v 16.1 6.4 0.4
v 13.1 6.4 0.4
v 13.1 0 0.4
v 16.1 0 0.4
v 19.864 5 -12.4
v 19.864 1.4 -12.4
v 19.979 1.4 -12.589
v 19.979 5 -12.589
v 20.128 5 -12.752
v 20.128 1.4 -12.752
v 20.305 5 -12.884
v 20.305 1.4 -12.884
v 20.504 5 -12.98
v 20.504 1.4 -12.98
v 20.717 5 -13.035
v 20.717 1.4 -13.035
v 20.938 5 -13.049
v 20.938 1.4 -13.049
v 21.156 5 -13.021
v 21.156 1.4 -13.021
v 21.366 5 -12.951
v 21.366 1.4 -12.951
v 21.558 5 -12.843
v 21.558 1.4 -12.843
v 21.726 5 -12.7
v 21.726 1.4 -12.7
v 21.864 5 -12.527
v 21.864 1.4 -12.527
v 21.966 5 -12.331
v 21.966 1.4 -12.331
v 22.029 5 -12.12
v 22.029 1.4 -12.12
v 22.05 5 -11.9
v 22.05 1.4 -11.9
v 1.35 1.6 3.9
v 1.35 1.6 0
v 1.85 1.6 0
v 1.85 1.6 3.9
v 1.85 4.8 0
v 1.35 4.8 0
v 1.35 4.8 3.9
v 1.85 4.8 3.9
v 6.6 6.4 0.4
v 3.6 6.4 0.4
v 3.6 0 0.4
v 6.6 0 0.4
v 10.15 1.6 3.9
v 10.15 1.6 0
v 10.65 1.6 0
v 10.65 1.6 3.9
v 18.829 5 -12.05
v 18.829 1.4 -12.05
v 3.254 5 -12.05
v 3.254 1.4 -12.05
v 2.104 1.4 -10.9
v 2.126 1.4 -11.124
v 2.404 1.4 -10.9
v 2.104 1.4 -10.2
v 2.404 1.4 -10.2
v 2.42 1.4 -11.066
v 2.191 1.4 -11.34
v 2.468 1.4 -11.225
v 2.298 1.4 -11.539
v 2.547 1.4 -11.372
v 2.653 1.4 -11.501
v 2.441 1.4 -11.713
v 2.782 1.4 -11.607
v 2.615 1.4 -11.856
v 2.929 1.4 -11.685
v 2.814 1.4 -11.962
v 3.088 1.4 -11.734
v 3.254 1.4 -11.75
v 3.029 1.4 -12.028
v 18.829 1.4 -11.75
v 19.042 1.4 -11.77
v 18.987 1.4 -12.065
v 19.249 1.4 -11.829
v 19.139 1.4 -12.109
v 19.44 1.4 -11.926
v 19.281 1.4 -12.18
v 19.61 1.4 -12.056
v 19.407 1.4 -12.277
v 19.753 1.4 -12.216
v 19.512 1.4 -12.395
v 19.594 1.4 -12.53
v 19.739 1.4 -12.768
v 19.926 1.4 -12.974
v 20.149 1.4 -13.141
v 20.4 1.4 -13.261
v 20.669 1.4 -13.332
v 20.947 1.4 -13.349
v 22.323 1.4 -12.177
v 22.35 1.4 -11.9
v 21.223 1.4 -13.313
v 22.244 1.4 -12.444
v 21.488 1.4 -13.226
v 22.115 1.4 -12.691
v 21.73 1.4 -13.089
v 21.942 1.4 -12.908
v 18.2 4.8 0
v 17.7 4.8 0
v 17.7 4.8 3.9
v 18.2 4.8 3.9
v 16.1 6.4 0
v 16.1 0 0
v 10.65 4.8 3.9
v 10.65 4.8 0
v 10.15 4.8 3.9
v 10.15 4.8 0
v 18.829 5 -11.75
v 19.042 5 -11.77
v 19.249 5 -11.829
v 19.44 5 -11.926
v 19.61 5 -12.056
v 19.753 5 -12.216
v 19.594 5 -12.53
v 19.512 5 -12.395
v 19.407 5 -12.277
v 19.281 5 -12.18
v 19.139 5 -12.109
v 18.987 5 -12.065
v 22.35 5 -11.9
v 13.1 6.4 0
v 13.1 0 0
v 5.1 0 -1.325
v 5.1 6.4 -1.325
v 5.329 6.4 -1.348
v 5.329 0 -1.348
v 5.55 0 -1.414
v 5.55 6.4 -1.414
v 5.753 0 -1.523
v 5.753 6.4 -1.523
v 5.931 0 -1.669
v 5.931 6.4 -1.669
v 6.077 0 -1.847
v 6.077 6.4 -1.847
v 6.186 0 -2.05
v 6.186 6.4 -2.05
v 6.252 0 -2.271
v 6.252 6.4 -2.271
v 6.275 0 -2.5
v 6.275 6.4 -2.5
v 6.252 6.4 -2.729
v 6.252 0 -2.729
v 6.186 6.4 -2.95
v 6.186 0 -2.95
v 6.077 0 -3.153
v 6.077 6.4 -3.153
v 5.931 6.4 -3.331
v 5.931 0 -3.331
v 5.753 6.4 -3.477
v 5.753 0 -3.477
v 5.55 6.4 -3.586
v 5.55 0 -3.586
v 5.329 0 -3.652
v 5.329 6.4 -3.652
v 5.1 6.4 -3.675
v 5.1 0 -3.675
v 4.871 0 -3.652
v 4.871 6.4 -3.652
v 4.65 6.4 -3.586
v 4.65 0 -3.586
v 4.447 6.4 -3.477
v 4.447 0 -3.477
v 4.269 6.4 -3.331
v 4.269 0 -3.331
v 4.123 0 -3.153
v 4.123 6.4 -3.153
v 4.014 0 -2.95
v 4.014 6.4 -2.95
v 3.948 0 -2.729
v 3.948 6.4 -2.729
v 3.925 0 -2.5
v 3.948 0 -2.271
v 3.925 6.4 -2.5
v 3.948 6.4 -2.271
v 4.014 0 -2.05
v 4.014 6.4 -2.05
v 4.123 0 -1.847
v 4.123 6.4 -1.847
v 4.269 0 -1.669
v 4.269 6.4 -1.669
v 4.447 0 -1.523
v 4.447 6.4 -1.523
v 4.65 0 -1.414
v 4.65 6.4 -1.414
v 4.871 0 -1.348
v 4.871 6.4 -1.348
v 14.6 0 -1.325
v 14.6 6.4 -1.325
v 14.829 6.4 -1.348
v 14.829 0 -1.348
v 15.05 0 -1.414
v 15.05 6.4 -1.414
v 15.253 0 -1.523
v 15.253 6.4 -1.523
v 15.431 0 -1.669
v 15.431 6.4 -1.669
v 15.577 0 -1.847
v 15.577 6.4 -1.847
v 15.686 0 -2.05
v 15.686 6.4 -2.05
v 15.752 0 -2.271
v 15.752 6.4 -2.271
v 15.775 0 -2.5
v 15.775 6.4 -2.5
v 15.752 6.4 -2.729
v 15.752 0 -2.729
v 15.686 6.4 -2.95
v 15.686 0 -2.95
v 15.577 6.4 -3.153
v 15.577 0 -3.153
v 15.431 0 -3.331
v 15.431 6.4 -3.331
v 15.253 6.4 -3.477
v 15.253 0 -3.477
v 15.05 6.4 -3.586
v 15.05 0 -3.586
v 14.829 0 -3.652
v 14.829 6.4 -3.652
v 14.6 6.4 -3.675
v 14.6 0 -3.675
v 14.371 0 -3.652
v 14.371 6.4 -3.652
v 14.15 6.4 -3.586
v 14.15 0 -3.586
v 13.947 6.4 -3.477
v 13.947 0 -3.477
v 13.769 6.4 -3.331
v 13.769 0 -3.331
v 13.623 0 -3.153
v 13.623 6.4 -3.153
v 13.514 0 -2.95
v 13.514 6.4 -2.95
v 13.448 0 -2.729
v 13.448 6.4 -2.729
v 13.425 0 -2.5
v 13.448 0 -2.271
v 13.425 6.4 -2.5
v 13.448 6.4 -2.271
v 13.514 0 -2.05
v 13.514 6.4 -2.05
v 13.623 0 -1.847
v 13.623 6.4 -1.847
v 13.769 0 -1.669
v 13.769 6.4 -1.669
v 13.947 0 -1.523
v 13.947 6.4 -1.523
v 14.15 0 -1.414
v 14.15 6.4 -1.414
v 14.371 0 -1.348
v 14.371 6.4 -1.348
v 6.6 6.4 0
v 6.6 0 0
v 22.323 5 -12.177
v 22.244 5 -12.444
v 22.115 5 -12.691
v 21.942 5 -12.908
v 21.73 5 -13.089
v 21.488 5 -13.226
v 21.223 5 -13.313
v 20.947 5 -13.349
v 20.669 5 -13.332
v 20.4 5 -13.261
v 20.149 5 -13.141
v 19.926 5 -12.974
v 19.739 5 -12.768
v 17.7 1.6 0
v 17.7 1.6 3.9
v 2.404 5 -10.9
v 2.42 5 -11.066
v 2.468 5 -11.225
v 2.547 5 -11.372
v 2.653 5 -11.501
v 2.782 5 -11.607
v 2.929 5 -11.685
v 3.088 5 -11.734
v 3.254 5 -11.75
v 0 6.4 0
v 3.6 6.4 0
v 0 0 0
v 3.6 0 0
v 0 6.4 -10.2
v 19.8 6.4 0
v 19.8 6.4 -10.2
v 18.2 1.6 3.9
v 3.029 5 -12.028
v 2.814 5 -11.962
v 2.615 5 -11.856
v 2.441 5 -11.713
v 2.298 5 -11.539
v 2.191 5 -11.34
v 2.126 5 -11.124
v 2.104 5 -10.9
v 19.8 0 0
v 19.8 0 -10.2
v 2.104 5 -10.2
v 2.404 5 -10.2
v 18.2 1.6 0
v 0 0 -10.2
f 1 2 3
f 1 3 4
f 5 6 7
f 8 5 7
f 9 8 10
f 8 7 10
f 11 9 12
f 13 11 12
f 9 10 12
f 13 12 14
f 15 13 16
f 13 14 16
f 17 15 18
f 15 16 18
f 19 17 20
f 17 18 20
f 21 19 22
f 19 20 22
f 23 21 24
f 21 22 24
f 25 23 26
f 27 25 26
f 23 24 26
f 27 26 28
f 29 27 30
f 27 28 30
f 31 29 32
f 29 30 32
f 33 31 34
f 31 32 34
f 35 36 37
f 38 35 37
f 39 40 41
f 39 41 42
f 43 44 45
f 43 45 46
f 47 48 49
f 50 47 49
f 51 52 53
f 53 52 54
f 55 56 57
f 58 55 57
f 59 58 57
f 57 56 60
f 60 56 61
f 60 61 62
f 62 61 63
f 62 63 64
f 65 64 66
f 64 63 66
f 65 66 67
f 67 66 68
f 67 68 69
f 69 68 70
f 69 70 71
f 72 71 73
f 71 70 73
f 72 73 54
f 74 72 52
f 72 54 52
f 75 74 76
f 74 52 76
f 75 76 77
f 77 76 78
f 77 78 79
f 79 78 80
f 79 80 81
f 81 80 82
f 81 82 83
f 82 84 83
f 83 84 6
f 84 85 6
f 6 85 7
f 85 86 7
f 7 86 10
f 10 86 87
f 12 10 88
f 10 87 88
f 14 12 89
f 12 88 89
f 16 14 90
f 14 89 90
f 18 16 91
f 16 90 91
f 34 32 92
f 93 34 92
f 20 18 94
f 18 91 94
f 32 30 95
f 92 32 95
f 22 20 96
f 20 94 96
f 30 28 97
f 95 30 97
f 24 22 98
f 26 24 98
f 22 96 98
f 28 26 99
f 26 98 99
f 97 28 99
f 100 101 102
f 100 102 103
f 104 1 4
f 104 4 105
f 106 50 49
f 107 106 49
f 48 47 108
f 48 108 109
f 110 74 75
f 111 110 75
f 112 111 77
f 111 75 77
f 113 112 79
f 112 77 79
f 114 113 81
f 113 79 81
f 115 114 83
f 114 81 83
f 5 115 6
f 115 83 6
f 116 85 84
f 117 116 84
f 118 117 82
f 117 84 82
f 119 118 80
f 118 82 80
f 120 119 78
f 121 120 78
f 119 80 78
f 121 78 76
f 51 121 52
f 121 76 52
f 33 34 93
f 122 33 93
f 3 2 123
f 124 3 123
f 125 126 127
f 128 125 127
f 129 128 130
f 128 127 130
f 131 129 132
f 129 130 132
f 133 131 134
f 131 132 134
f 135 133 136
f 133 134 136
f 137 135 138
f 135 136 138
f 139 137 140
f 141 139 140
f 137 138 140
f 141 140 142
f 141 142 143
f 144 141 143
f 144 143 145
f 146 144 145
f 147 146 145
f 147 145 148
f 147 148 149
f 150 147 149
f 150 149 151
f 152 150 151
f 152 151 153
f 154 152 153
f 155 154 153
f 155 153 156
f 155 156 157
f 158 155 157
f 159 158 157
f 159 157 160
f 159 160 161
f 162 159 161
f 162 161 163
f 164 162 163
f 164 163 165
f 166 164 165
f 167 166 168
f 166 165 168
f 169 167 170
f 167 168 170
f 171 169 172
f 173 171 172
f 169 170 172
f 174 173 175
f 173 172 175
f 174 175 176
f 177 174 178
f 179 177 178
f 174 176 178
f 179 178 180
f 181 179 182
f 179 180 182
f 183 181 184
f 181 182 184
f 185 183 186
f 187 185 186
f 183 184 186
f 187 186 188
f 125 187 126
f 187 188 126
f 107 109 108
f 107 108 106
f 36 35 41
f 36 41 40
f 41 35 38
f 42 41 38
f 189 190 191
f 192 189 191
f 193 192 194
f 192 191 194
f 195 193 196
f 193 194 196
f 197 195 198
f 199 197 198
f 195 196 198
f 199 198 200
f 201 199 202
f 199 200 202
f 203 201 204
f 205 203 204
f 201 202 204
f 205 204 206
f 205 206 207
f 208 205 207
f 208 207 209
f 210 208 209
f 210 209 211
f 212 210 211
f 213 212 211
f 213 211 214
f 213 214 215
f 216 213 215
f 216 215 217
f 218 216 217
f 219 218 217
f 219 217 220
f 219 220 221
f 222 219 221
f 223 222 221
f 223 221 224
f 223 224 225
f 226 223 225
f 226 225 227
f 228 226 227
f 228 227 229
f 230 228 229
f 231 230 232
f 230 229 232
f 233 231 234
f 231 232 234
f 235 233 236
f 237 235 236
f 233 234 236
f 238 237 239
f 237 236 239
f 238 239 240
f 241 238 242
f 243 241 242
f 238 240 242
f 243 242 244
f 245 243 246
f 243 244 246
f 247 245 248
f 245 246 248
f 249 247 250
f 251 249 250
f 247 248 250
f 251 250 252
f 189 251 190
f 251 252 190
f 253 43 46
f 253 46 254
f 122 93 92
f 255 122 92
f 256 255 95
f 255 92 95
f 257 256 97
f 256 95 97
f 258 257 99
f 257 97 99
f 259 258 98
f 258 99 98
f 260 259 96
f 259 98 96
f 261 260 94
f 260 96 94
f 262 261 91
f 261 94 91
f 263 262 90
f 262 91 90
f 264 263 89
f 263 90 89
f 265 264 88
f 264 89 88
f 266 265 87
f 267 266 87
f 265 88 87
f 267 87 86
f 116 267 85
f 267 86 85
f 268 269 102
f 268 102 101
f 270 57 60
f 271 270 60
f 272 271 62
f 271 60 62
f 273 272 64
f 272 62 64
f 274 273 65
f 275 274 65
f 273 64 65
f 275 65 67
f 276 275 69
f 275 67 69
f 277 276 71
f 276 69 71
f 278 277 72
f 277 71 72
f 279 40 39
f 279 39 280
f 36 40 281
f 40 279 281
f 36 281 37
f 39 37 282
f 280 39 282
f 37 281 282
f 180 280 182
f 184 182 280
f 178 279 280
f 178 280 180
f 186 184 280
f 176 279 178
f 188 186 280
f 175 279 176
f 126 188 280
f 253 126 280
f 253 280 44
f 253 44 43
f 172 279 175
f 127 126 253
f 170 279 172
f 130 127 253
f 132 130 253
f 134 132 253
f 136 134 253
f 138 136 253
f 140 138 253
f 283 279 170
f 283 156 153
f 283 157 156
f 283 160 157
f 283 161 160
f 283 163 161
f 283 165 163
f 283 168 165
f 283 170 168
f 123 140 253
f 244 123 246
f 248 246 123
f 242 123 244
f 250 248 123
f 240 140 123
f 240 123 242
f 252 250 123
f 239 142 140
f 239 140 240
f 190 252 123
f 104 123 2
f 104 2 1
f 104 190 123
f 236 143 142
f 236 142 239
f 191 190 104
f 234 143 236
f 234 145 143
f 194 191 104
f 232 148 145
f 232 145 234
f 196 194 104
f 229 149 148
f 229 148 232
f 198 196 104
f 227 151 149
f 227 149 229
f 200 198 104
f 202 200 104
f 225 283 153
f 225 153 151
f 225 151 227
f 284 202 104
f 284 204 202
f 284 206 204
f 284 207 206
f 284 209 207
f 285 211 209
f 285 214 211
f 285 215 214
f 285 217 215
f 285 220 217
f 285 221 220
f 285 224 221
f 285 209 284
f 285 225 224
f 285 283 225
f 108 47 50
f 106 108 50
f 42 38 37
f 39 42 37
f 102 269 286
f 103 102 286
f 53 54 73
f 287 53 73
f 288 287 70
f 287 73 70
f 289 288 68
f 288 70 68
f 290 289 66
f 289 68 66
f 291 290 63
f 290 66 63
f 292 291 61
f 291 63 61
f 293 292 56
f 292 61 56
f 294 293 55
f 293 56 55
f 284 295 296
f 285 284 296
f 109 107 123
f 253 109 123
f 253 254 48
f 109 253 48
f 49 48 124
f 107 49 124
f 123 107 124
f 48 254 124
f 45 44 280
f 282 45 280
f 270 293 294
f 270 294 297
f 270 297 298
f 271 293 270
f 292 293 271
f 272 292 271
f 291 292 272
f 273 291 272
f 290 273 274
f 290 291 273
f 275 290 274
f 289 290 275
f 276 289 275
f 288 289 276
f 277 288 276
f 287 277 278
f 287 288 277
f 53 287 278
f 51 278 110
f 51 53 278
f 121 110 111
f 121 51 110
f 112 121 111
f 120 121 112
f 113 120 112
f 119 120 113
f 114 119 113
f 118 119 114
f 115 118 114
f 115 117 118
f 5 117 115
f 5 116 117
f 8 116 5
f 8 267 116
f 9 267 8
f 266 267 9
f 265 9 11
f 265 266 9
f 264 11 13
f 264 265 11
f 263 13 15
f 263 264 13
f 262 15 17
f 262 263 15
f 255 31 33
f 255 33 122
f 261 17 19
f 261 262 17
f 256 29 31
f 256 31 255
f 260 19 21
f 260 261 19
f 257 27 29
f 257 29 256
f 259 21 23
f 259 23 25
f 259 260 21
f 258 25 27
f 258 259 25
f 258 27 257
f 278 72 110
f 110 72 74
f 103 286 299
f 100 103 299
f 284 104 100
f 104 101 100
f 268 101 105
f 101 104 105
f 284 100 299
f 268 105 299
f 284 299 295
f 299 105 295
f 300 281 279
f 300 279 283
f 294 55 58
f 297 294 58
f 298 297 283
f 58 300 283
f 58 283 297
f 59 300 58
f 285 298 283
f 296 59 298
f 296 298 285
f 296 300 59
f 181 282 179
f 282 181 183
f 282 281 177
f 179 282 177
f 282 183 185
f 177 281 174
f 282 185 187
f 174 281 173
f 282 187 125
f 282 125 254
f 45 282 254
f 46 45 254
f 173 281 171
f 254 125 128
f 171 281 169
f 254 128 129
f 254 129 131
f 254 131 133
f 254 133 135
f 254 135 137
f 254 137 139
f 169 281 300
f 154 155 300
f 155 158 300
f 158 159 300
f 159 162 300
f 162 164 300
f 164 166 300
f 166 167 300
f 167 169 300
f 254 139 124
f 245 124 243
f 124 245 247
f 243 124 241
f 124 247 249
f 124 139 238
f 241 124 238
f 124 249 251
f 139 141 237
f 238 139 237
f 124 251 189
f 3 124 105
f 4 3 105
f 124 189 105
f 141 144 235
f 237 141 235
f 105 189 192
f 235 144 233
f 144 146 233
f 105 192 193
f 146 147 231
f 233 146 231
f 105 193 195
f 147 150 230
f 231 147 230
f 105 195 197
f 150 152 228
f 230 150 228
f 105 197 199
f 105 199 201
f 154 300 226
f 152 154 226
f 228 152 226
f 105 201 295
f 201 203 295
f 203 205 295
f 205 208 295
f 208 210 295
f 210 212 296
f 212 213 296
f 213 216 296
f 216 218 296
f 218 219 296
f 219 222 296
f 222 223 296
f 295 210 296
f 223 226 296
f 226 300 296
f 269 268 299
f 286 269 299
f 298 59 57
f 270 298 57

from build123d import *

# Parameters (mm, degrees)
SKETCH_1_W             = 19.8
SKETCH_1_H             = 10.2
EXTRUDE_1_DEPTH        = 6.4
CUT_EXTRUDE_1_REACH    = 25.174
SKETCH_2_R             = 1.175
EXTRUDE_1_2_DEPTH      = 1.8
EXTRUDE_1_2_DEPTH_BACK = 1.8
EXTRUDE_2_DEPTH        = 1.6
EXTRUDE_2_DEPTH_BACK   = 1.6
SKETCH_4_W             = 0.5
SKETCH_4_H             = 3.9
SKETCH_5_W             = 3
SKETCH_5_H             = 0.4
EXTRUDE_2_2_DEPTH      = 6.4


with BuildPart() as part:
    # 草图1 → Extrude 1 (new body)
    with BuildSketch(Plane(origin=(0, 0, 0), x_dir=(1, 0, 0), z_dir=(0, 1, 0))):
        with Locations((9.9, 5.1)):
            Rectangle(SKETCH_1_W, SKETCH_1_H)
    extrude(amount=EXTRUDE_1_DEPTH)

    # 草图2 → 切除-拉伸1 (cut, up to next)
    with BuildSketch(Plane(origin=(0, 6.4, 0), x_dir=(1, 0, 0), z_dir=(0, 1, 0)), mode=Mode.PRIVATE) as cut_extrude_1_sk1:
        with Locations(Location((5.1, 2.5, 0), (0, 0, 270))):
            Circle(SKETCH_2_R)
    cut_extrude_1_tool1 = extrude(cut_extrude_1_sk1.sketch, amount=-CUT_EXTRUDE_1_REACH, mode=Mode.PRIVATE) & part.part
    # 草图2 → 切除-拉伸1 (cut, up to next)
    with BuildSketch(Plane(origin=(0, 6.4, 0), x_dir=(1, 0, 0), z_dir=(0, 1, 0)), mode=Mode.PRIVATE) as cut_extrude_1_sk2:
        with Locations(Location((14.6, 2.5, 0), (0, 0, 270))):
            Circle(SKETCH_2_R)
    cut_extrude_1_tool2 = extrude(cut_extrude_1_sk2.sketch, amount=-CUT_EXTRUDE_1_REACH, mode=Mode.PRIVATE) & part.part
    add(cut_extrude_1_tool1.solids().sort_by_distance((5.1, 6.4, -2.5))[0], mode=Mode.SUBTRACT)
    add(cut_extrude_1_tool2.solids().sort_by_distance((14.6, 6.4, -2.5))[0], mode=Mode.SUBTRACT)

    # 草图3 → Extrude 1 2 (add, two sides: drawn at the far end of the back side and taken through both)
    with BuildSketch(Plane(origin=(0, 3.2, 0), x_dir=(1, 0, 0), z_dir=(0, 1, 0)).offset(-EXTRUDE_1_2_DEPTH_BACK)):
        with BuildLine():
            Line((2.403782047, 10.2), (2.403782047, 10.9))
            ThreePointArc((2.403782047, 10.9), (2.652741283, 11.501040764), (3.253782047, 11.75))
            Line((3.253782047, 11.75), (18.828768482, 11.75))
            ThreePointArc((18.828768482, 11.75), (19.440119445, 11.925962013), (19.864384241, 12.4))
            ThreePointArc((19.864384241, 12.4), (21.156458454, 13.021039277), (22.05, 11.9))
            Line((22.05, 11.9), (22.35, 11.9))
            ThreePointArc((22.35, 11.9), (21.223360659, 13.313484306), (19.594223608, 12.530434783))
            ThreePointArc((19.594223608, 12.530434783), (19.280636585, 12.180058879), (18.828768482, 12.05))
            Line((18.828768482, 12.05), (3.253782047, 12.05))
            ThreePointArc((3.253782047, 12.05), (2.440609249, 11.713172798), (2.103782047, 10.9))
            Line((2.103782047, 10.9), (2.103782047, 10.2))
            Line((2.103782047, 10.2), (2.403782047, 10.2))
        make_face()
    extrude(amount=EXTRUDE_1_2_DEPTH + EXTRUDE_1_2_DEPTH_BACK)

    # 草图4 → Extrude 2 (add, two sides: drawn at the far end of the back side and taken through both)
    with BuildSketch(Plane(origin=(0, 3.2, 0), x_dir=(1, 0, 0), z_dir=(0, 1, 0)).offset(-EXTRUDE_2_DEPTH_BACK)):
        with Locations((1.6, -1.95)):
            Rectangle(SKETCH_4_W, SKETCH_4_H)
        with Locations((10.4, -1.95)):
            Rectangle(SKETCH_4_W, SKETCH_4_H)
        with Locations((17.95, -1.95)):
            Rectangle(SKETCH_4_W, SKETCH_4_H)
    extrude(amount=EXTRUDE_2_DEPTH + EXTRUDE_2_DEPTH_BACK)

    # 草图5 → Extrude 2 2 (add)
    with BuildSketch(Plane(origin=(0, 6.4, 0), x_dir=(1, 0, 0), z_dir=(0, 1, 0))):
        with Locations((5.1, -0.2)):
            Rectangle(SKETCH_5_W, SKETCH_5_H)
        with Locations((14.6, -0.2)):
            Rectangle(SKETCH_5_W, SKETCH_5_H)
    extrude(amount=-EXTRUDE_2_2_DEPTH)


solid = part.part
